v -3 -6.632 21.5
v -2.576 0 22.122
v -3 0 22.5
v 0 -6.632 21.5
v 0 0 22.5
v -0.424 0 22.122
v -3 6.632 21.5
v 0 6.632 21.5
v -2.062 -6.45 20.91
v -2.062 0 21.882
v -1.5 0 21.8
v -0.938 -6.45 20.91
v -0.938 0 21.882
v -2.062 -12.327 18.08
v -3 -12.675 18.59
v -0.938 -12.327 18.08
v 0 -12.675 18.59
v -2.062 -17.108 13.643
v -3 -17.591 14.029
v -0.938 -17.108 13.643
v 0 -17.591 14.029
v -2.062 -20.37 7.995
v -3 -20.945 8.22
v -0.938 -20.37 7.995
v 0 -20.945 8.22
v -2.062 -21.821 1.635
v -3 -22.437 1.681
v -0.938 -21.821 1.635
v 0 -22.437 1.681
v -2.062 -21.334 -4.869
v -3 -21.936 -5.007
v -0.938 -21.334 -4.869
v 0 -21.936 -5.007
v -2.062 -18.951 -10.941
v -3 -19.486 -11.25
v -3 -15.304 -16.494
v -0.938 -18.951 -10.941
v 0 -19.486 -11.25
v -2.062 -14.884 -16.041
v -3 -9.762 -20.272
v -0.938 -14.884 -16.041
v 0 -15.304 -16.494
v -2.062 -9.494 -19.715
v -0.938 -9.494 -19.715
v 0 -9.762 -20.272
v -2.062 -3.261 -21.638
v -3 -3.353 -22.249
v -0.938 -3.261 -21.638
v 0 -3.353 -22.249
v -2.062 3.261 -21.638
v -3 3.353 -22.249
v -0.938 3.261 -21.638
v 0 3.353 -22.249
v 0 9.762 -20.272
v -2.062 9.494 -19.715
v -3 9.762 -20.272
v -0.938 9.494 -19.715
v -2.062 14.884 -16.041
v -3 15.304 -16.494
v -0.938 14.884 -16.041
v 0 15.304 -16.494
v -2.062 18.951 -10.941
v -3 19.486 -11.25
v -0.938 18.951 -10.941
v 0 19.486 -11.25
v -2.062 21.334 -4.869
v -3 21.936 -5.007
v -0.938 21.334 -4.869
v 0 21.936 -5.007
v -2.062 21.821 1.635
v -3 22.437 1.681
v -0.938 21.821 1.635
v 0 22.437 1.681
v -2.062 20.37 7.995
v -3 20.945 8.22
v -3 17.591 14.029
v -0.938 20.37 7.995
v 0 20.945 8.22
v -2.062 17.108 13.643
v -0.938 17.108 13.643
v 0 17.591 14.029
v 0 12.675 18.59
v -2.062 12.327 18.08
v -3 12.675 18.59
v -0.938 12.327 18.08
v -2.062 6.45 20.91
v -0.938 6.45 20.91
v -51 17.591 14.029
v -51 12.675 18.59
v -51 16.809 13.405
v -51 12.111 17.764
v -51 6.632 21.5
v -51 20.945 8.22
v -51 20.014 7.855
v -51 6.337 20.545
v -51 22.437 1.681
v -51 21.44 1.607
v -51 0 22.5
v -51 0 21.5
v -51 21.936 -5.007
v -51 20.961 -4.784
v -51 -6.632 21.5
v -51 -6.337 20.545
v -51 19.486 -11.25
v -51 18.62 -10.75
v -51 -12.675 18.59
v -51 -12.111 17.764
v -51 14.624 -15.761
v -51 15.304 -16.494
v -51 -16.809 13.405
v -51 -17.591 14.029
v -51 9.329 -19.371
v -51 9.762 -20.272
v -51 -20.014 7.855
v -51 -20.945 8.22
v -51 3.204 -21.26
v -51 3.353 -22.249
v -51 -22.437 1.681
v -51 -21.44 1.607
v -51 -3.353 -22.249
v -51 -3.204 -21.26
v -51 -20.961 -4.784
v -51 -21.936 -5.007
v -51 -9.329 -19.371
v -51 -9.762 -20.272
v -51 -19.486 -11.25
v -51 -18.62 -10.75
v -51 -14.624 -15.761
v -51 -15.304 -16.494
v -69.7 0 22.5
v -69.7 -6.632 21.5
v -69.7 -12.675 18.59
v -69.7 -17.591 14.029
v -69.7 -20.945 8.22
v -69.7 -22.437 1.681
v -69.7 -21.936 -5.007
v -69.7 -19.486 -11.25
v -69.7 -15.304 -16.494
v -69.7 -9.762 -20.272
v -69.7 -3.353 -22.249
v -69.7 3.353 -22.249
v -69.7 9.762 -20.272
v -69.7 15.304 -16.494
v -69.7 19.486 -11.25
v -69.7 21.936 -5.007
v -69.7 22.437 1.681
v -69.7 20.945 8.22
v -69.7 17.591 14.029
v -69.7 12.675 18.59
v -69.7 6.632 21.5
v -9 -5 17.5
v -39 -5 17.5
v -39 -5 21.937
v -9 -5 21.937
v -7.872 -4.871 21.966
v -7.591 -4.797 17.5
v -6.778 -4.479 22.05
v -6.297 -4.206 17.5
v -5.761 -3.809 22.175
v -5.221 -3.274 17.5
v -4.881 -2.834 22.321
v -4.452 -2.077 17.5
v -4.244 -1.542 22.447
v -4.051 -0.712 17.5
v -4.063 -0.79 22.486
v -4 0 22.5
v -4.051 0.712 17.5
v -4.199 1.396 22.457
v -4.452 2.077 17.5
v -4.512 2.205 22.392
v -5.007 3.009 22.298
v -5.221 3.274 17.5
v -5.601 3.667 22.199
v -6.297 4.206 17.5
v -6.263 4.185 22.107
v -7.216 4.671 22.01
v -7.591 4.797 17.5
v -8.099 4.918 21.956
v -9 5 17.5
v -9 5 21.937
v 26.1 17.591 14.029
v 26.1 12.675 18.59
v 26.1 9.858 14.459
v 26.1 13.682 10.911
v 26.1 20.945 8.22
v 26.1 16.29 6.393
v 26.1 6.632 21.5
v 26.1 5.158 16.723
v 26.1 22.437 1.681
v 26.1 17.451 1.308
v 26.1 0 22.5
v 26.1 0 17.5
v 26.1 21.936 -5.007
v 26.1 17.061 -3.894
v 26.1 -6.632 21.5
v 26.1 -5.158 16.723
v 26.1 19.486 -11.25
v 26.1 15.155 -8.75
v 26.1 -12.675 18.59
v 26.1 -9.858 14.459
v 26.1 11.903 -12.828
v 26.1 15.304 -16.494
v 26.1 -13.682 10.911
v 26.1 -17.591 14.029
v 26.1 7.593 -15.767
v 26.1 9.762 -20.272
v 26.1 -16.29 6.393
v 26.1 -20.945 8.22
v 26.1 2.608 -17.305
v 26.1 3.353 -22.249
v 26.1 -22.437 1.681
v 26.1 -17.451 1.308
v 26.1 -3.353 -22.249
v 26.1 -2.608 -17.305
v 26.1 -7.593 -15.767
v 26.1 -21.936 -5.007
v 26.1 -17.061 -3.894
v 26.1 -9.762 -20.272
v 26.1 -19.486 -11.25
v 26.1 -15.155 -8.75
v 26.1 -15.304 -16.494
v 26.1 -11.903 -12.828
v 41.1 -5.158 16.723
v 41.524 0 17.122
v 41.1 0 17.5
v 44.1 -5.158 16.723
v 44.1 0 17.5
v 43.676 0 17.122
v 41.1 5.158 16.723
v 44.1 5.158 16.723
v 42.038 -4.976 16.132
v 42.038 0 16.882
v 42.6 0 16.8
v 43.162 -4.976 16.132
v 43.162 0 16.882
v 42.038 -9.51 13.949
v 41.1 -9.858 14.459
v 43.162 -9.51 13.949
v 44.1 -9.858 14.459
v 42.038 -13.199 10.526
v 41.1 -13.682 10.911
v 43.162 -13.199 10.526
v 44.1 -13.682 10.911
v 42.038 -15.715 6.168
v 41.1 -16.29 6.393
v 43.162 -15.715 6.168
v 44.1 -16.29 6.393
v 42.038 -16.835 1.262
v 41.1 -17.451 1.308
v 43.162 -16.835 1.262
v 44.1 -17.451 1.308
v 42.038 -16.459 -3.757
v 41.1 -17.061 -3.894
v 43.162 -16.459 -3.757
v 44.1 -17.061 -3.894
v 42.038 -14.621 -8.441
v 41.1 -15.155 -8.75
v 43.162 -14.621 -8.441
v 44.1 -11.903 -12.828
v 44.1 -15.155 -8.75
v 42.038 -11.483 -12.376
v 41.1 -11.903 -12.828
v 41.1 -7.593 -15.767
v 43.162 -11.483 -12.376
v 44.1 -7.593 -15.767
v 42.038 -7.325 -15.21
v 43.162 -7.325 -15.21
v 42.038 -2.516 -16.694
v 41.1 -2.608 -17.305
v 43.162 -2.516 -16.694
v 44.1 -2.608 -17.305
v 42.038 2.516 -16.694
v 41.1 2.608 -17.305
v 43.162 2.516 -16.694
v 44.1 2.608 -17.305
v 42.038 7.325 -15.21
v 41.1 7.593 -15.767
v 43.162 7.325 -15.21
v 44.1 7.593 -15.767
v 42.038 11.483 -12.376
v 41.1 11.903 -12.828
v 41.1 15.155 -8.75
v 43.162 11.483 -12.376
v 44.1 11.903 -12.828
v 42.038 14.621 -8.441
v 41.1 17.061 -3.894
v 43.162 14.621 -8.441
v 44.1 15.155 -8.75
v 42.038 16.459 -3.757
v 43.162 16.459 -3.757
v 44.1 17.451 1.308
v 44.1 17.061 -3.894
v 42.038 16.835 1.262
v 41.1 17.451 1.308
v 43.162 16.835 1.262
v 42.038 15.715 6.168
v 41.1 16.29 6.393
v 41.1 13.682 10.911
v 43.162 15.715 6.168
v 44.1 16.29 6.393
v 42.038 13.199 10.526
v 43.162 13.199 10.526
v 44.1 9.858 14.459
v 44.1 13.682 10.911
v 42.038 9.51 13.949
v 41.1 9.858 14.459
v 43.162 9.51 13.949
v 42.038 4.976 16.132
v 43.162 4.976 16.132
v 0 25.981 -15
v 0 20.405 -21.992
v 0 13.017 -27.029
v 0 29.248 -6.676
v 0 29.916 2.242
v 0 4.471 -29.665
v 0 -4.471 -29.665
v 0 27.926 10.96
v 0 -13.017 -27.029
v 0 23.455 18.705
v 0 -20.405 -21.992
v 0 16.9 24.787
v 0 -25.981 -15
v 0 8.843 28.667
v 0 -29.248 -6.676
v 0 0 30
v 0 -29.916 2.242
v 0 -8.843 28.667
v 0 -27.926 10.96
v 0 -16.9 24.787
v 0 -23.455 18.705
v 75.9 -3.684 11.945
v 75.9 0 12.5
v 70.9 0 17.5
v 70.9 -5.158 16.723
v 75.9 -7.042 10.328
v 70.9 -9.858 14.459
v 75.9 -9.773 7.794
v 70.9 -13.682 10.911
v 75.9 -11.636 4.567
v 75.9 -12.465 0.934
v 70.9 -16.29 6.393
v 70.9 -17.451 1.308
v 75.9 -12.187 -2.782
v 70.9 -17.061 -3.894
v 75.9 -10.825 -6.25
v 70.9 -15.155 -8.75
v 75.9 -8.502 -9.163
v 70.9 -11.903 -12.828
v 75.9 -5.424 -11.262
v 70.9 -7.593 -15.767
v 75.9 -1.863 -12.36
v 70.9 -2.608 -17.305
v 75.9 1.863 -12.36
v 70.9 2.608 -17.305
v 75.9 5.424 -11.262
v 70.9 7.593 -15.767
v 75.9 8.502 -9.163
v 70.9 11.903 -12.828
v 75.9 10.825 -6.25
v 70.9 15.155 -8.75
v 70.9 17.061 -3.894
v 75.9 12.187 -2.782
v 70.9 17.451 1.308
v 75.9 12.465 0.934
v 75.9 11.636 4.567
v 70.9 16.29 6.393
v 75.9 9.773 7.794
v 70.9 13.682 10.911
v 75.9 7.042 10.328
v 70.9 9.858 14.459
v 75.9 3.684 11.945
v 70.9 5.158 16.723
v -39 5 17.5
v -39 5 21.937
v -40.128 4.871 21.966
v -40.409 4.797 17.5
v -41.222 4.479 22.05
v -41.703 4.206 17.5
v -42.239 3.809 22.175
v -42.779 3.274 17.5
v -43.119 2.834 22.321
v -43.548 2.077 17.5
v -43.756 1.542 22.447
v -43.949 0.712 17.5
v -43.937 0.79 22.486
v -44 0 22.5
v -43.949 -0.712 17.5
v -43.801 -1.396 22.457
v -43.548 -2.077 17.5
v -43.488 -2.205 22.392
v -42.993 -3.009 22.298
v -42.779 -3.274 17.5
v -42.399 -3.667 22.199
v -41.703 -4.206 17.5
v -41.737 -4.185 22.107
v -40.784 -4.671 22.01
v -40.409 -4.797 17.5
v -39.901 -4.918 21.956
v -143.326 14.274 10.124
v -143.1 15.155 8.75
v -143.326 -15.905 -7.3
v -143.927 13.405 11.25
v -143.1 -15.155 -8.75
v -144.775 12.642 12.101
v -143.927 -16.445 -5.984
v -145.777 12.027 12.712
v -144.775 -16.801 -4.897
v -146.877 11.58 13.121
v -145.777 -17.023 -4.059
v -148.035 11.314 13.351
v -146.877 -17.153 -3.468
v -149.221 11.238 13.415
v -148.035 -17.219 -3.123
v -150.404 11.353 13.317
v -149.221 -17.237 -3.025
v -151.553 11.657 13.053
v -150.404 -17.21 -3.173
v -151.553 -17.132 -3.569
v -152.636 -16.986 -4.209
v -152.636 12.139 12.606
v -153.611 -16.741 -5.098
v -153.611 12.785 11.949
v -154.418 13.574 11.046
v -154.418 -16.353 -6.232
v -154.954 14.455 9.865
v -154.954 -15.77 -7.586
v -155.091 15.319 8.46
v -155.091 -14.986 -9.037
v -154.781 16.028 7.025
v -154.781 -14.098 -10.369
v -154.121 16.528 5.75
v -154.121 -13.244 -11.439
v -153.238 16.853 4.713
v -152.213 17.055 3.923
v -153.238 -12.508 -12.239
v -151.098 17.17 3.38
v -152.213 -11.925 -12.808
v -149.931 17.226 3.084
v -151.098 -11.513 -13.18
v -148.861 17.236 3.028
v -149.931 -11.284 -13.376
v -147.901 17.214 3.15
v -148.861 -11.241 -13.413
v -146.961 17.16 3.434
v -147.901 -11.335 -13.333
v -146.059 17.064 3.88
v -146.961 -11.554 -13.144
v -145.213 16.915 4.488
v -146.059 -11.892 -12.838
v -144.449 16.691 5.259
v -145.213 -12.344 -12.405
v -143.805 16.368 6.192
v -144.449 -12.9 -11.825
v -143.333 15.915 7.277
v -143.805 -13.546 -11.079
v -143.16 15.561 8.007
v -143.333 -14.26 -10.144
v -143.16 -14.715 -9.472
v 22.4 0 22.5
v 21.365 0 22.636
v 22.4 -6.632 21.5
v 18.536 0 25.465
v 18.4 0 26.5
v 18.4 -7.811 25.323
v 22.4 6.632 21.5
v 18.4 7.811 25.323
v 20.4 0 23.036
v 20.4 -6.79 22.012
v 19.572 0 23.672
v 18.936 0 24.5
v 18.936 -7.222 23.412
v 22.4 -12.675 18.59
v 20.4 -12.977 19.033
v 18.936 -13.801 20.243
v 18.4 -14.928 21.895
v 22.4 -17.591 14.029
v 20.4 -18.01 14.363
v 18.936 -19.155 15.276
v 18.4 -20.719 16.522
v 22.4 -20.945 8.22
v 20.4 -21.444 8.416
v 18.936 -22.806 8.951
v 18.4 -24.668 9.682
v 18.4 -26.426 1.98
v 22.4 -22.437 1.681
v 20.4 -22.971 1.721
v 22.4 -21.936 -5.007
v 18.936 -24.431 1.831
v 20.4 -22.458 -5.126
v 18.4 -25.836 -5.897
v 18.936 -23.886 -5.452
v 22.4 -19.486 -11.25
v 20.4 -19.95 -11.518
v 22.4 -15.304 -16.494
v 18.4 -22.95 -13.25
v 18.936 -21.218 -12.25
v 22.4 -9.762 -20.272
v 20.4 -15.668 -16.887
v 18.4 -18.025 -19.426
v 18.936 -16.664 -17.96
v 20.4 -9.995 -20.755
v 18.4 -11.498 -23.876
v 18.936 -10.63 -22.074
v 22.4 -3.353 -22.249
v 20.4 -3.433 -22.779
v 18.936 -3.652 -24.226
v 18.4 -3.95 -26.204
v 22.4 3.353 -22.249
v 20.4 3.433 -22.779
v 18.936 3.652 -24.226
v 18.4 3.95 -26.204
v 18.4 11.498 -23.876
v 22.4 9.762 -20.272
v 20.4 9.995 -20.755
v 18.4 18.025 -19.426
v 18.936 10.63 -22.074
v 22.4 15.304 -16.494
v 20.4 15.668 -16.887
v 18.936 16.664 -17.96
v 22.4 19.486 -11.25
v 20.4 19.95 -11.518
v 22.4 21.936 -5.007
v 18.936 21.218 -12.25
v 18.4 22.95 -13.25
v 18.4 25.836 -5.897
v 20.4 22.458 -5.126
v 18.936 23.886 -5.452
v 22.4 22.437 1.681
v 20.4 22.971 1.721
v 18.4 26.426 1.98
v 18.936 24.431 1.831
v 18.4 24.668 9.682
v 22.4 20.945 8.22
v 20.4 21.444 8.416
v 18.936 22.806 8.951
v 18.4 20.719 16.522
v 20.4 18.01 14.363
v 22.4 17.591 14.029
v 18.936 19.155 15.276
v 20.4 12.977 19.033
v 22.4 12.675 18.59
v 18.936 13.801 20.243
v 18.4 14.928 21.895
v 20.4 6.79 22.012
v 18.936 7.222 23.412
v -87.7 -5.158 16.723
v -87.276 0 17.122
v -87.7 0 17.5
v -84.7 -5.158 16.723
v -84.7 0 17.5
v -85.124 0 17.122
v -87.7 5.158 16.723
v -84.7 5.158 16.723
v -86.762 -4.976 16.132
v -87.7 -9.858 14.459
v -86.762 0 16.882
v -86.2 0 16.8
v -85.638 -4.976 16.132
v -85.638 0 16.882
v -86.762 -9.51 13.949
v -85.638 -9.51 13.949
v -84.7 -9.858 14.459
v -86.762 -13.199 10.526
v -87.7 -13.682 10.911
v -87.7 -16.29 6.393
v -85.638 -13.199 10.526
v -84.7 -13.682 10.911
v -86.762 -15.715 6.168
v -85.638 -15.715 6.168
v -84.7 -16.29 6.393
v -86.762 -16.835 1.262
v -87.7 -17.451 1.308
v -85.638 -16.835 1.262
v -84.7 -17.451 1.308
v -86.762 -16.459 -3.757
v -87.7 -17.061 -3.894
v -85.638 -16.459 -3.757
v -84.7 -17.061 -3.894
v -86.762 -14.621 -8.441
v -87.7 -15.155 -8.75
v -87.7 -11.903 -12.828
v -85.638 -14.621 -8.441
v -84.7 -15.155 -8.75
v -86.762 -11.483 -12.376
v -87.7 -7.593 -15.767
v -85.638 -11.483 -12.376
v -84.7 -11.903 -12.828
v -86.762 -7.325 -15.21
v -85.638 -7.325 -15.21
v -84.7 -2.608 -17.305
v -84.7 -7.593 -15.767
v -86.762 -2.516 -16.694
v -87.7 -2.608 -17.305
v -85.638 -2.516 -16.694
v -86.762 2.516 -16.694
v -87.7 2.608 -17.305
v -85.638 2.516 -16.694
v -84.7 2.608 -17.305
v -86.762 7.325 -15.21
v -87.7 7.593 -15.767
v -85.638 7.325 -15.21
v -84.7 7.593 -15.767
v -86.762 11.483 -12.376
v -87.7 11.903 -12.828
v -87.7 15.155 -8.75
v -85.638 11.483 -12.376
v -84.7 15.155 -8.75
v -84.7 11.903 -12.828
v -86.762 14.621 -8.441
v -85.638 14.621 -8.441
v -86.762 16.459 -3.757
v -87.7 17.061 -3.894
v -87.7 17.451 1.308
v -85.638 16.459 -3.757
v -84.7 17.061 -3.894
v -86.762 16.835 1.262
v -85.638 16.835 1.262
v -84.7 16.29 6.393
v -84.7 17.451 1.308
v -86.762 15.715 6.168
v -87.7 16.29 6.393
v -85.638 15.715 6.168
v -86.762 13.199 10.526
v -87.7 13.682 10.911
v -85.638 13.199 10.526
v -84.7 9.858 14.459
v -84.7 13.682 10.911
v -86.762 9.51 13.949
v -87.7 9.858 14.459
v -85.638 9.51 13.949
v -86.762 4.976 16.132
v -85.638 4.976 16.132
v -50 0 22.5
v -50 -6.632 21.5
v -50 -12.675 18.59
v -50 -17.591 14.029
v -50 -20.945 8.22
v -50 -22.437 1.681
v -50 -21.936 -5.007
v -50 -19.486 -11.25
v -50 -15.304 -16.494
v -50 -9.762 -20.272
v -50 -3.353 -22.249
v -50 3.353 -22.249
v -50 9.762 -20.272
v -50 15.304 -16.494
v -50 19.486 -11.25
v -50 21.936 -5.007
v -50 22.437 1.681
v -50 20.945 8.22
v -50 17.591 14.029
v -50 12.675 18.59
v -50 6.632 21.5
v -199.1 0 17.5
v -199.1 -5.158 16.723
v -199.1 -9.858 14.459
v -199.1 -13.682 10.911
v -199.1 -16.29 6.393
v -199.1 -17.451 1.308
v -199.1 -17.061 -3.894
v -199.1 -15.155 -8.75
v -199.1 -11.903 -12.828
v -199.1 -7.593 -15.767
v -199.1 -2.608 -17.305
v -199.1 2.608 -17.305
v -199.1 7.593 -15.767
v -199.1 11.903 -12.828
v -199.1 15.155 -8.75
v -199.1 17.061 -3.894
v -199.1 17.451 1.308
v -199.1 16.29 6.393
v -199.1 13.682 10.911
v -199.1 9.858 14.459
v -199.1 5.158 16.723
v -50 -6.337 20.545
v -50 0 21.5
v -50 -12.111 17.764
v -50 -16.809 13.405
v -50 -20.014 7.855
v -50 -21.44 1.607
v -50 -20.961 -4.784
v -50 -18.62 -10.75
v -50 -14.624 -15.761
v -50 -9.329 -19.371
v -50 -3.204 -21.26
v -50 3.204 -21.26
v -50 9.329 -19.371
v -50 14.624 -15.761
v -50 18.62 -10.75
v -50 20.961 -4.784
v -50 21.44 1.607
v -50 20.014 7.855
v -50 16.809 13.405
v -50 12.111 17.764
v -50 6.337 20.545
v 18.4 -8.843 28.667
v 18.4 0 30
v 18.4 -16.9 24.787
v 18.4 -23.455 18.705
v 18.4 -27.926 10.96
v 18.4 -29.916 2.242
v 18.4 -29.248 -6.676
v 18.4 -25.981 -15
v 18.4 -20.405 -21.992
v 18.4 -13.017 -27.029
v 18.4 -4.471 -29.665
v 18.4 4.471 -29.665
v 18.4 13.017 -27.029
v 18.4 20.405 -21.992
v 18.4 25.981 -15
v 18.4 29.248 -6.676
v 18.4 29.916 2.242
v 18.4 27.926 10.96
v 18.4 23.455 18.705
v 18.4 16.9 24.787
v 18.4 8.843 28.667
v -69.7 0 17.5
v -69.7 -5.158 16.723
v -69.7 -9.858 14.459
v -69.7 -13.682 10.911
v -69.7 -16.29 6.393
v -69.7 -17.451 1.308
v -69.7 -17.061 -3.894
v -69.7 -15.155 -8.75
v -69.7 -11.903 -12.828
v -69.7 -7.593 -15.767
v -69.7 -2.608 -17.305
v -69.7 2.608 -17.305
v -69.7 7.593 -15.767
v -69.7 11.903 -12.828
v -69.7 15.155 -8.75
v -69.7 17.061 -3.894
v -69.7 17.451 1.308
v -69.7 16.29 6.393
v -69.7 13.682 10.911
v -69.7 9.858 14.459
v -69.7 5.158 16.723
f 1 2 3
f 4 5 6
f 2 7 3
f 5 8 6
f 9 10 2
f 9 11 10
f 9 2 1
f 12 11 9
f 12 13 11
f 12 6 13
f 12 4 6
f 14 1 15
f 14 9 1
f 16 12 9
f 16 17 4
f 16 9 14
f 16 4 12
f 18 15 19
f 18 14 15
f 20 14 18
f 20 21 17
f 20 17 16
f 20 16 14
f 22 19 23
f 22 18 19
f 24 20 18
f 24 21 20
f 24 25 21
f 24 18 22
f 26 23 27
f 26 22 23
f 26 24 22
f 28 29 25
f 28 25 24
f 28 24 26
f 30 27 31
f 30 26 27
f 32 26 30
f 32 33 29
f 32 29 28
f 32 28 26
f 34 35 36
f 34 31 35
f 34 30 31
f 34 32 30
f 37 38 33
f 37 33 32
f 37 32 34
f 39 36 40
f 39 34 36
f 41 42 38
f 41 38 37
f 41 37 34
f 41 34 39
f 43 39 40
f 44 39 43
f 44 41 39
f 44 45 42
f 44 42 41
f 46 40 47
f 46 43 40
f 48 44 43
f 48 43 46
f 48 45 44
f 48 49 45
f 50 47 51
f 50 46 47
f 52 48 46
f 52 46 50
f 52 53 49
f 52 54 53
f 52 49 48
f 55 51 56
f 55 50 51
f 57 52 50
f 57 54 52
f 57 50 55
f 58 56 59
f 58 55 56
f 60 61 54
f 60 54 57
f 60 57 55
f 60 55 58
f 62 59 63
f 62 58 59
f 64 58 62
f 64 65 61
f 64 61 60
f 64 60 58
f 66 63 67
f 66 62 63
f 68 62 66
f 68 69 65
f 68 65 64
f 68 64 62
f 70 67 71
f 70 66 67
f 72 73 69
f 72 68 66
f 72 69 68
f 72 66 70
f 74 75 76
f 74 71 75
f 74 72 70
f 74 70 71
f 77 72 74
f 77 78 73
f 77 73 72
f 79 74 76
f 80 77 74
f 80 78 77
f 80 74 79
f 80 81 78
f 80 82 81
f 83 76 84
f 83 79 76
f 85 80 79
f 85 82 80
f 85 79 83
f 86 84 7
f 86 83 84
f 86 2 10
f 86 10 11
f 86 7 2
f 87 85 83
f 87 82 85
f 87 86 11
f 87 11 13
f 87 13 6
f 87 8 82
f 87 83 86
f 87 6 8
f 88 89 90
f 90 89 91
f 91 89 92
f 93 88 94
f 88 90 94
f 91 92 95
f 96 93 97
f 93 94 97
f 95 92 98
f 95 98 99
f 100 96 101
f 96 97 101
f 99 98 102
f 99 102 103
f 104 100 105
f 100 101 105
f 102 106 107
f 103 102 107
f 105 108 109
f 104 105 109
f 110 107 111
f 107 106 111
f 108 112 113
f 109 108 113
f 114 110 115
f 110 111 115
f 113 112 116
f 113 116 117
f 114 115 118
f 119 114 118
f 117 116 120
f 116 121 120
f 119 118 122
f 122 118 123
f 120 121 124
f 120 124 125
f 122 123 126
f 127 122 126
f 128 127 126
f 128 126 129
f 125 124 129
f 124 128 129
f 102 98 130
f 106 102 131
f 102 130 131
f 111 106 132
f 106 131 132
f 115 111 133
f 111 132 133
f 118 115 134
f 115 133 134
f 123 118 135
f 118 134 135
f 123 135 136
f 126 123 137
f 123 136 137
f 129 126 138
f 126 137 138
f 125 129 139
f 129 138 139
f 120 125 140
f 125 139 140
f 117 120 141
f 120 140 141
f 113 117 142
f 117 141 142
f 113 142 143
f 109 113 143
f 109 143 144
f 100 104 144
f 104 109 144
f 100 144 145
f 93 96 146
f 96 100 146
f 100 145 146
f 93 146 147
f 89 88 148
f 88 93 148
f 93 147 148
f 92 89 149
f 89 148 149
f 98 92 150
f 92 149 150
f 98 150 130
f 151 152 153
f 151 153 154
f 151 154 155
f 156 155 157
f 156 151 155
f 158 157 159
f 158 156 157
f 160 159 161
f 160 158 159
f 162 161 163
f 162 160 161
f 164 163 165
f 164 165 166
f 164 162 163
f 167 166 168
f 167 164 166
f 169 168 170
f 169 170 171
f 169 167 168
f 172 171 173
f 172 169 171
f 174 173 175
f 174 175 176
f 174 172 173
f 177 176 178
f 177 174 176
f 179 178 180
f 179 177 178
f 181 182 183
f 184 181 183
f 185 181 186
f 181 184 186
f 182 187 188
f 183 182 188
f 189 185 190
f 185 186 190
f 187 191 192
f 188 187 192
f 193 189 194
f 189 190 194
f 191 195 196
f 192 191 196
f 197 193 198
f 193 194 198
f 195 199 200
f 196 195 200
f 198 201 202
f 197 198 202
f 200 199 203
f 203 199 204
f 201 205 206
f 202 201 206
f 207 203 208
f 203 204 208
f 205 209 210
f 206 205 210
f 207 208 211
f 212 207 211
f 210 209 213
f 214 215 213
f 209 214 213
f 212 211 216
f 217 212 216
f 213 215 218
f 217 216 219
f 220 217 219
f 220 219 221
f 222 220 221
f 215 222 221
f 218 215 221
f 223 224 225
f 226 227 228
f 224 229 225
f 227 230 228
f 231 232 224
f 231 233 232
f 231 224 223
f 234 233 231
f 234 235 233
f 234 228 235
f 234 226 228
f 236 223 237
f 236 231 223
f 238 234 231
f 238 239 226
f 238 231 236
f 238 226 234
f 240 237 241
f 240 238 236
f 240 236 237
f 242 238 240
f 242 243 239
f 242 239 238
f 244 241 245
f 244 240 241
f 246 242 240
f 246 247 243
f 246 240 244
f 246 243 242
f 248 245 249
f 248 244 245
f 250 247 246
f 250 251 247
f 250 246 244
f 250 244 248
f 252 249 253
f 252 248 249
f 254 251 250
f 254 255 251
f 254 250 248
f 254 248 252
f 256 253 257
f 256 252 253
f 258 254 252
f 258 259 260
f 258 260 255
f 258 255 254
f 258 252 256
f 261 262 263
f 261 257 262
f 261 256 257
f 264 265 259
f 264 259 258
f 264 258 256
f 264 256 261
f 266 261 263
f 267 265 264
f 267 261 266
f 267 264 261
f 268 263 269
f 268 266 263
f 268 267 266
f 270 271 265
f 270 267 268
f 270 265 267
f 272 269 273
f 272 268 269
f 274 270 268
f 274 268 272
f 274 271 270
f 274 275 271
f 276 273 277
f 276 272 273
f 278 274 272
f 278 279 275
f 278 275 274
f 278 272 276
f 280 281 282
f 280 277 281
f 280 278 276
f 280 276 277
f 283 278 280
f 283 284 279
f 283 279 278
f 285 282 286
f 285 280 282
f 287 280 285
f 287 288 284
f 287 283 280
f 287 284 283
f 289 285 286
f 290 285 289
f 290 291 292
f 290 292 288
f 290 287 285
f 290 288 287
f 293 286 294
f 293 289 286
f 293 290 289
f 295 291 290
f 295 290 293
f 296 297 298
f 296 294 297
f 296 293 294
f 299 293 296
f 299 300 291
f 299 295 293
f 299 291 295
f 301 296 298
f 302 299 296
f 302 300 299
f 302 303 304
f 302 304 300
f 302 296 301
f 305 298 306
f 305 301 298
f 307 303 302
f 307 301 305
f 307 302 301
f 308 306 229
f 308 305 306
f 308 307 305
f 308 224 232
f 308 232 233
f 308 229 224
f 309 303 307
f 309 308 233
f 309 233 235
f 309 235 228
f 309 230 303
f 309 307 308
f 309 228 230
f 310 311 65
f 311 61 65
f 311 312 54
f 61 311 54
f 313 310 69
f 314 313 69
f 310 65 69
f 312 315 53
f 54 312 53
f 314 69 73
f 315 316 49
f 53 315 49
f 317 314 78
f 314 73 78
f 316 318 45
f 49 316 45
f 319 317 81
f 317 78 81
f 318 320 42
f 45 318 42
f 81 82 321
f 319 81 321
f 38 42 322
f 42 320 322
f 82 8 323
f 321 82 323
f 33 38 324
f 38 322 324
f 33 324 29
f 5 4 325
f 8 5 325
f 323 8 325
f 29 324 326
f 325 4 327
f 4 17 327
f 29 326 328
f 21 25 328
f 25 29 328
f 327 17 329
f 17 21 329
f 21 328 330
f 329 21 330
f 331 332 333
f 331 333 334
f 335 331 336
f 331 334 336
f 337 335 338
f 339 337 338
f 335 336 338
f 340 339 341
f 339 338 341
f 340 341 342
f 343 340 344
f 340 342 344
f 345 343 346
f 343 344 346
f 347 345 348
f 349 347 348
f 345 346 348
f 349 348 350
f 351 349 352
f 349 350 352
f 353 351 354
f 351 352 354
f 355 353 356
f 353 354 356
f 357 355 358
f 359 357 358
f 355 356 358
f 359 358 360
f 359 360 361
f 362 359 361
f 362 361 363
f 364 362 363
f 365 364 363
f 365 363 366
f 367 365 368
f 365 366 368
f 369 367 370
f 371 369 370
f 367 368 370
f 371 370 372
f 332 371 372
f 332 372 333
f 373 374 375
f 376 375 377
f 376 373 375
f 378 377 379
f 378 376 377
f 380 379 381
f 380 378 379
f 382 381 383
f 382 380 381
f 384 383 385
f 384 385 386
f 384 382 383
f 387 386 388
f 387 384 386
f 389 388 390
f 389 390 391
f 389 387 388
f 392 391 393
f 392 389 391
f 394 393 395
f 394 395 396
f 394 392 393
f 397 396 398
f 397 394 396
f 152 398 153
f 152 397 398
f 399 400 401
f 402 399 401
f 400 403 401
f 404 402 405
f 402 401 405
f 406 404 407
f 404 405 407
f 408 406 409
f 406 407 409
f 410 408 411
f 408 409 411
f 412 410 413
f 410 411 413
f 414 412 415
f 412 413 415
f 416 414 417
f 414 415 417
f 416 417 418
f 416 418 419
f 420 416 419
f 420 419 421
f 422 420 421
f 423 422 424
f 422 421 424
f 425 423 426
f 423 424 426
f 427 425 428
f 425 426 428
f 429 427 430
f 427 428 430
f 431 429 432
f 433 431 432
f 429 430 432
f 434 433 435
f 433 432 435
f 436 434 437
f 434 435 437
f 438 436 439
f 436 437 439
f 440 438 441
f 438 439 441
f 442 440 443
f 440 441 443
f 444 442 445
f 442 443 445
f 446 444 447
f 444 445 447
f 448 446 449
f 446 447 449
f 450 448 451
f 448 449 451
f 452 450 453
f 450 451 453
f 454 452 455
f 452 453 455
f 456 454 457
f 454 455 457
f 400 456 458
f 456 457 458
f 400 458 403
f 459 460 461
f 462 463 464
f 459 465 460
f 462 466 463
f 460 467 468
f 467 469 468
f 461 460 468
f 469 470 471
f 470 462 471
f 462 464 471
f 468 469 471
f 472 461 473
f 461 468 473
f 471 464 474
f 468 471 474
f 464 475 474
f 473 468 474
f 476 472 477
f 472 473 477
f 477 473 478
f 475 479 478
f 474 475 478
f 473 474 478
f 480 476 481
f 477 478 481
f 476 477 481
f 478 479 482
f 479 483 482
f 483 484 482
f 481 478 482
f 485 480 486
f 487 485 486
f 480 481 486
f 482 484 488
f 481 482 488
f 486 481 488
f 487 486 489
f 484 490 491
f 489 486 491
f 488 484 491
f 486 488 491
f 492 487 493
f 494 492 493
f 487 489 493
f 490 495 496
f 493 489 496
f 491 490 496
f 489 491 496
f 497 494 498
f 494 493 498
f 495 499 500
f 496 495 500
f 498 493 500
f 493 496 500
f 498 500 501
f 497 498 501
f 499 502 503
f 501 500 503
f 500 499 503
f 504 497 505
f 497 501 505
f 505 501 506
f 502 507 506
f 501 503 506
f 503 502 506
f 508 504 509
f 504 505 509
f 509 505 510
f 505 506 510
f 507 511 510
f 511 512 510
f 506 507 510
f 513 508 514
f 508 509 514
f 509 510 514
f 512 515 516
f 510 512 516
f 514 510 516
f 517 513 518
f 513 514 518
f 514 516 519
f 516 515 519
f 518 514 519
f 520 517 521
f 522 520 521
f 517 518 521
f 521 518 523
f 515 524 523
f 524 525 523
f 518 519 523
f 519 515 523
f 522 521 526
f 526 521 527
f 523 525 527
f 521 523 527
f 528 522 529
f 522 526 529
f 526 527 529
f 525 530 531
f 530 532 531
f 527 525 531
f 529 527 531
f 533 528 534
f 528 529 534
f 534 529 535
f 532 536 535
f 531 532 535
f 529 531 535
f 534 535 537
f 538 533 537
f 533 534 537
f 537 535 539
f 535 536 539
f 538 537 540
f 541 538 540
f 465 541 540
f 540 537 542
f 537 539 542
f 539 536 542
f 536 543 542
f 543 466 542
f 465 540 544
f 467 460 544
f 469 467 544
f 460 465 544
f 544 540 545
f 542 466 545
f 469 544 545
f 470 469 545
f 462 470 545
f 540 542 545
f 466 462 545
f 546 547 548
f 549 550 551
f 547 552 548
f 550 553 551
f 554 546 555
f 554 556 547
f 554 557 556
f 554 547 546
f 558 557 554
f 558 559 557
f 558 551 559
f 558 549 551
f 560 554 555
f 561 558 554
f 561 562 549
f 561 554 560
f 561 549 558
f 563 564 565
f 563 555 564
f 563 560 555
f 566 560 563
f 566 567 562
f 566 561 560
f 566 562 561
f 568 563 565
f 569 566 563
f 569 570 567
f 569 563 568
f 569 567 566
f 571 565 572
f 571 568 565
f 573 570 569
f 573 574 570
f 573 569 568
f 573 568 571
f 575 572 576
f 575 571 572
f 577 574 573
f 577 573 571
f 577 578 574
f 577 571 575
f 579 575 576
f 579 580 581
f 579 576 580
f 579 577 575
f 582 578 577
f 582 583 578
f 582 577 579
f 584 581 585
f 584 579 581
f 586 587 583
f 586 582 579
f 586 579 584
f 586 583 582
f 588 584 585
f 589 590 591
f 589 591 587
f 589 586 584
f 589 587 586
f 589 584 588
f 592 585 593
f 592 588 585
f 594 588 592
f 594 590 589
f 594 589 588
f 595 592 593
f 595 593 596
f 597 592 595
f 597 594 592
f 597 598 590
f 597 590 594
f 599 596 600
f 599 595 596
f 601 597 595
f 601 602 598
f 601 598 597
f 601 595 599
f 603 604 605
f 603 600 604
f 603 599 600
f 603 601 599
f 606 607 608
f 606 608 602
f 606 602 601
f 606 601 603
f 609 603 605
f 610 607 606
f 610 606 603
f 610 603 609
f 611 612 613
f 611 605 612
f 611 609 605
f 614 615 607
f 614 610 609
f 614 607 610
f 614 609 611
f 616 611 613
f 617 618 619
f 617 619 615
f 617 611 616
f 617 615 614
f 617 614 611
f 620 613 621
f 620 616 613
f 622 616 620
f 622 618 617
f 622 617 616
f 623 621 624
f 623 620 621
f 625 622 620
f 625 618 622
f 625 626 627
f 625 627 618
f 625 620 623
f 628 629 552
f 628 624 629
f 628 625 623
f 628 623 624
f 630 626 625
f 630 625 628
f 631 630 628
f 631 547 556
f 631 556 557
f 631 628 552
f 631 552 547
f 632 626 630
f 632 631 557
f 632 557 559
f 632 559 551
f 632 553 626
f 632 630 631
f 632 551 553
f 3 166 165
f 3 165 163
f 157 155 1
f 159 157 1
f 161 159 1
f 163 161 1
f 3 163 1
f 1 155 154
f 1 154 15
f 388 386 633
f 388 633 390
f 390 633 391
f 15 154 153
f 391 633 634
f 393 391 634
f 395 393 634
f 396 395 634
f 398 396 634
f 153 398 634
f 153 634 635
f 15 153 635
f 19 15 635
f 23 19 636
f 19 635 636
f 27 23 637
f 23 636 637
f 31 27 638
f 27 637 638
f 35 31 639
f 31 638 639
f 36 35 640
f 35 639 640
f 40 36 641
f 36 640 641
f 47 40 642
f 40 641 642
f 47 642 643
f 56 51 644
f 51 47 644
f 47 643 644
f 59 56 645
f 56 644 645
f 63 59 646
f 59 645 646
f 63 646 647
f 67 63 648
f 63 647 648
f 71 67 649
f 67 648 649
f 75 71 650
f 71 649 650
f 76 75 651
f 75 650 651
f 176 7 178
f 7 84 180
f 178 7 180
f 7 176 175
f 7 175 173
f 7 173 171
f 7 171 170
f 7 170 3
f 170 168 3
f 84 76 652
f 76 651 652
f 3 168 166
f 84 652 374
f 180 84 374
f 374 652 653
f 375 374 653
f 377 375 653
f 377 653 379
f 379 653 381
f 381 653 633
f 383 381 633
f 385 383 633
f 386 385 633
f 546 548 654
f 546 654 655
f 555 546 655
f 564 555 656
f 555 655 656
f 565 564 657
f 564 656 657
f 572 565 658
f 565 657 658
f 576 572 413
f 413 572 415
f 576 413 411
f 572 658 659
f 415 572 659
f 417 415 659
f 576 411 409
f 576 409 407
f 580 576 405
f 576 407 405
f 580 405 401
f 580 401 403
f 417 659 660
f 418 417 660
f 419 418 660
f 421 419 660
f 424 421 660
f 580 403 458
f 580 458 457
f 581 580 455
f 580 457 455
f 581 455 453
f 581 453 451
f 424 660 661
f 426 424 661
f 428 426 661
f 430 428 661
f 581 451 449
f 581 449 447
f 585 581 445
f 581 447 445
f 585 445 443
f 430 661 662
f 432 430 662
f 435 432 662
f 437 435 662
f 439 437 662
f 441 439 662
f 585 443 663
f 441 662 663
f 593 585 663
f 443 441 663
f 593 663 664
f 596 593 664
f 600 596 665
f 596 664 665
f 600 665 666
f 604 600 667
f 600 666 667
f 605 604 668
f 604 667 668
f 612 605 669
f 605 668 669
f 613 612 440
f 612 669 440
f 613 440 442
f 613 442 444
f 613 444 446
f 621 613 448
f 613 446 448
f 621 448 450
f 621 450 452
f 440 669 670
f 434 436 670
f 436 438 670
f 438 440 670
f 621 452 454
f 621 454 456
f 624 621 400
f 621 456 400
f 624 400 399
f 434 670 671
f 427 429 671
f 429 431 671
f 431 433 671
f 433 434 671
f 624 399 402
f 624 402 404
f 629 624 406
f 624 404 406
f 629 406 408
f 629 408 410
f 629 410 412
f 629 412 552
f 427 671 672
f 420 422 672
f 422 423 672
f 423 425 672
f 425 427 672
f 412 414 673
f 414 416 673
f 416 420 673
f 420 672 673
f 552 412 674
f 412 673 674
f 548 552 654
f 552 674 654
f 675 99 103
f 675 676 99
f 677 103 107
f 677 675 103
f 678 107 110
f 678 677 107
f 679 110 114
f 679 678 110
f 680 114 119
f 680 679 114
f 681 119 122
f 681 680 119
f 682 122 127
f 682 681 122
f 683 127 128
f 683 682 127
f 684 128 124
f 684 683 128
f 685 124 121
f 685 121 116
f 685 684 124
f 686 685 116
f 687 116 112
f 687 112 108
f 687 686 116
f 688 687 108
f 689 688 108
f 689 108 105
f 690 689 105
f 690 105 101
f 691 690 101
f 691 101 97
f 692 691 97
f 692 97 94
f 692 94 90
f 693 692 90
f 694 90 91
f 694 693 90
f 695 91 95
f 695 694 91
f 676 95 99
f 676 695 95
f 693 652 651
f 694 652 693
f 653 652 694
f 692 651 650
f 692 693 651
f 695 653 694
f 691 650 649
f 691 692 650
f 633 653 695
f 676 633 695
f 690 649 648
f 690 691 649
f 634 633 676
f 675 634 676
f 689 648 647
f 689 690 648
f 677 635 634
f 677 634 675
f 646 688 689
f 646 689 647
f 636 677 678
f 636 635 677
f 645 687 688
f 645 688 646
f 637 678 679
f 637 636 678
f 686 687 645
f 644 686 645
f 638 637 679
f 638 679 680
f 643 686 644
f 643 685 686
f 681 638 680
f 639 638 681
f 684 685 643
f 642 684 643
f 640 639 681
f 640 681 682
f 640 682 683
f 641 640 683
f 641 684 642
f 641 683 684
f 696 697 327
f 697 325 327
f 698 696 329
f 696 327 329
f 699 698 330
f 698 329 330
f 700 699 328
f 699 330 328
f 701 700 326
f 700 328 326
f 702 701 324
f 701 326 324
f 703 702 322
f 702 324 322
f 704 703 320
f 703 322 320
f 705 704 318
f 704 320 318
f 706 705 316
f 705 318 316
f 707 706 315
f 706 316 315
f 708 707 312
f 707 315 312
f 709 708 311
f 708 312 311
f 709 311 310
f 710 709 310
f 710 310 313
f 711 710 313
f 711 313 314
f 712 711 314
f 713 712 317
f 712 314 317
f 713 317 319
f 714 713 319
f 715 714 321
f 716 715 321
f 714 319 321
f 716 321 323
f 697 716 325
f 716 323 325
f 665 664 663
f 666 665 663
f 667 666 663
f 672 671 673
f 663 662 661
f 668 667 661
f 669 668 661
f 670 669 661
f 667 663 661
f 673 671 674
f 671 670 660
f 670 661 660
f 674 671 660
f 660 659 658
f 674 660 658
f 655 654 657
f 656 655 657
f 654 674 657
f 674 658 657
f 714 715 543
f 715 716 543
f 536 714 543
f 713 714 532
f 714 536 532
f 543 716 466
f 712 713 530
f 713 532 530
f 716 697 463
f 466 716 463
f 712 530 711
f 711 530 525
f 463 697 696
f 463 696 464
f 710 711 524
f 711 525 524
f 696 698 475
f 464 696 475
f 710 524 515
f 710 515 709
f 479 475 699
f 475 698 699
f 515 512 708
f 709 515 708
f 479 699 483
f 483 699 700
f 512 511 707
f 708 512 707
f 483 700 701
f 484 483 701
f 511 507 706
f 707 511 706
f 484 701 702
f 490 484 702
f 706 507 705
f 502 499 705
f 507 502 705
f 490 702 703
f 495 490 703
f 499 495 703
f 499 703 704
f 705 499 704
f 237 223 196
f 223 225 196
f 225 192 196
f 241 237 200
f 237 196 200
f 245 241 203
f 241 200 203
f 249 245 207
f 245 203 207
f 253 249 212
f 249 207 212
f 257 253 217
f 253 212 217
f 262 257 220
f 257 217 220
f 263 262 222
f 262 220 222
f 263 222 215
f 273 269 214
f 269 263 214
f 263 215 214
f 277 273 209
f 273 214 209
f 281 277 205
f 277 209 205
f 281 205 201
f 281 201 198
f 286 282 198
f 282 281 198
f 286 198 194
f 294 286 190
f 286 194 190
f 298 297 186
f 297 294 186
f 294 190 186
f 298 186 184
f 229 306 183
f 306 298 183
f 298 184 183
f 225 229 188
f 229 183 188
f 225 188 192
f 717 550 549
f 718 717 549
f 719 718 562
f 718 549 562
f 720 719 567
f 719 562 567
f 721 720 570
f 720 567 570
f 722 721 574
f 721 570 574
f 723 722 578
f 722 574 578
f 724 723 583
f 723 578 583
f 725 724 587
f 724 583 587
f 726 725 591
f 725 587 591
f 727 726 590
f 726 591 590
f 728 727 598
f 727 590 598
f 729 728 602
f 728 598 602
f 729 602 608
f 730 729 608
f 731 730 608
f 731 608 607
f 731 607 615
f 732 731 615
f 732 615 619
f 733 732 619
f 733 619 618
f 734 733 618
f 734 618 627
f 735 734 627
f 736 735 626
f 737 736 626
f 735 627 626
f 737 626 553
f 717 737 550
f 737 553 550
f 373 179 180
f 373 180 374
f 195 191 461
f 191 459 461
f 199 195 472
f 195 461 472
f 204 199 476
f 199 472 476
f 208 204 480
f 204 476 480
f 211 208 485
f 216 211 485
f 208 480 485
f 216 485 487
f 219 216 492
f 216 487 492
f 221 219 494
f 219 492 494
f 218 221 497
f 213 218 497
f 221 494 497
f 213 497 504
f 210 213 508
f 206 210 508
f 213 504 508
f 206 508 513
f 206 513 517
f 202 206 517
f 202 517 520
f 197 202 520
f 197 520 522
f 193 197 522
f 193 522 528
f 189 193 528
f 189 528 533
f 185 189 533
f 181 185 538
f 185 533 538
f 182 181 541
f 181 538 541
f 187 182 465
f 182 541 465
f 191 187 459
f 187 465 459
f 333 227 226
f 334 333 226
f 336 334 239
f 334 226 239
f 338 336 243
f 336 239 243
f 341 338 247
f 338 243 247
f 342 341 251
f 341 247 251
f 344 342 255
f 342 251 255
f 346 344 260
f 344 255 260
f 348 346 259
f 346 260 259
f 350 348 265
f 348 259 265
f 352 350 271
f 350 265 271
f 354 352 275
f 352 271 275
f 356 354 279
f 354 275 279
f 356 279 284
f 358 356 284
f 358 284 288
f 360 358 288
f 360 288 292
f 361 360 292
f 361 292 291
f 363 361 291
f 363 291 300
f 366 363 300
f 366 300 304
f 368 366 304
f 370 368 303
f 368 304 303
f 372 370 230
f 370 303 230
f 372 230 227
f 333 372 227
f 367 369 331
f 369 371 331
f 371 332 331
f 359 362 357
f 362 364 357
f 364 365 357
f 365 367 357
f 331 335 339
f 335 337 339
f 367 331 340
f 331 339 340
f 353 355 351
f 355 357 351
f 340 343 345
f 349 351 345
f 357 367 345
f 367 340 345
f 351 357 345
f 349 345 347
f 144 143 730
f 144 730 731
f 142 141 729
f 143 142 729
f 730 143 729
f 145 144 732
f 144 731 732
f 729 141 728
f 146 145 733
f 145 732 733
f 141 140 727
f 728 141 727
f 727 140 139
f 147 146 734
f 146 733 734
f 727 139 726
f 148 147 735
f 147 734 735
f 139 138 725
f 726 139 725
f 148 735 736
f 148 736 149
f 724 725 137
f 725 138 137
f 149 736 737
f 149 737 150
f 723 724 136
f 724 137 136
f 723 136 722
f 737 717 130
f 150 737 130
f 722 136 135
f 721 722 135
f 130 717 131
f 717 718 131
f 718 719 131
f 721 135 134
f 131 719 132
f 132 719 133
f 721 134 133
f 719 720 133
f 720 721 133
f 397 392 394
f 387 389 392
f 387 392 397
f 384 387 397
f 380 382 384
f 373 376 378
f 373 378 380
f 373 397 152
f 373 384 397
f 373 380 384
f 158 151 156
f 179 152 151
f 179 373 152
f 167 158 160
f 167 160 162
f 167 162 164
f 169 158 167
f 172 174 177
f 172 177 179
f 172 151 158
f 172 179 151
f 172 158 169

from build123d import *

# Parameters (mm, degrees)
F2_W           = 1
F2_H           = 12
F4_R           = 1.9571428571
F7_START       = 17.5
F7_DEPTH       = 42.5
F11_R          = 6
F12_DEPTH      = 25
F12_DEPTH_BACK = 25


with BuildPart() as f1:
    # F0 (on Front) → F1 (revolve)
    with BuildSketch(Plane.XZ):
        with BuildLine():
            Line((-199.1, 17.5), (-199.1, 0))
            Line((-199.1, 0), (75.9, 0))
            Line((75.9, 0), (75.9, 12.5))
            Line((75.9, 12.5), (70.9, 17.5))
            Line((70.9, 17.5), (26.1, 17.5))
            Line((26.1, 17.5), (26.1, 22.5))
            Line((26.1, 22.5), (22.4, 22.5))
            ThreePointArc((22.4, 22.5), (19.5715728753, 23.6715728753), (18.4, 26.5))
            Line((18.4, 26.5), (18.4, 30))
            Line((18.4, 30), (0, 30))
            Line((0, 30), (0, 22.5))
            Line((0, 22.5), (-69.7, 22.5))
            Line((-69.7, 22.5), (-69.7, 17.5))
            Line((-69.7, 17.5), (-199.1, 17.5))
        make_face()
    revolve(axis=Axis((-55.8219029194, 0, 0), (1, 0, 0)))

    # F2 (on Front) → F3 (revolve, cut)
    with BuildSketch(Plane.XZ):
        with Locations((-50.5, 27.5)):
            Rectangle(F2_W, F2_H)
    revolve(axis=Axis((-55.8219029194, 0, 0), (1, 0, 0)), mode=Mode.SUBTRACT)

    # F4 (on Front) → F5 (revolve, cut)
    with BuildSketch(Plane.XZ):
        with Locations((-86.2, 18.7571428571)):
            Circle(F4_R)
        with Locations((42.6, 18.7571428571)):
            Circle(F4_R)
        with BuildLine():
            Line((-3.4571428571, 32.4009352645), (-3.4571428571, 23.7571428571))
            ThreePointArc((-3.4571428571, 23.7571428571), (-2.1688399949, 21.9178328712), (0, 22.5))
            Line((0, 22.5), (0, 32.4009352645))
            Line((0, 32.4009352645), (-3.4571428571, 32.4009352645))
        make_face()
    revolve(axis=Axis((-55.8219029194, 0, 0), (1, 0, 0)), mode=Mode.SUBTRACT)

    # F6 (on Top) → F7 (cut)
    with BuildSketch(Plane.XY.offset(F7_START)):
        with BuildLine():
            Line((-9, 5), (-39, 5))
            ThreePointArc((-39, 5), (-44, 0), (-39, -5))
            Line((-39, -5), (-9, -5))
            ThreePointArc((-9, -5), (-4, 0), (-9, 5))
        make_face()
    extrude(amount=F7_DEPTH, mode=Mode.SUBTRACT)

    # F11 (on line) → F12 (cut, two sides)
    with BuildSketch(Plane(origin=(0, 0, 0), x_dir=(1, 0, 0), z_dir=(0, -0.8660254038, -0.5))) as f12_sk:
        with Locations((-149.1, 0)):
            Circle(F11_R)
    extrude(amount=-F12_DEPTH, mode=Mode.SUBTRACT)
    extrude(f12_sk.sketch, amount=F12_DEPTH_BACK, mode=Mode.SUBTRACT)


solid = f1.part
